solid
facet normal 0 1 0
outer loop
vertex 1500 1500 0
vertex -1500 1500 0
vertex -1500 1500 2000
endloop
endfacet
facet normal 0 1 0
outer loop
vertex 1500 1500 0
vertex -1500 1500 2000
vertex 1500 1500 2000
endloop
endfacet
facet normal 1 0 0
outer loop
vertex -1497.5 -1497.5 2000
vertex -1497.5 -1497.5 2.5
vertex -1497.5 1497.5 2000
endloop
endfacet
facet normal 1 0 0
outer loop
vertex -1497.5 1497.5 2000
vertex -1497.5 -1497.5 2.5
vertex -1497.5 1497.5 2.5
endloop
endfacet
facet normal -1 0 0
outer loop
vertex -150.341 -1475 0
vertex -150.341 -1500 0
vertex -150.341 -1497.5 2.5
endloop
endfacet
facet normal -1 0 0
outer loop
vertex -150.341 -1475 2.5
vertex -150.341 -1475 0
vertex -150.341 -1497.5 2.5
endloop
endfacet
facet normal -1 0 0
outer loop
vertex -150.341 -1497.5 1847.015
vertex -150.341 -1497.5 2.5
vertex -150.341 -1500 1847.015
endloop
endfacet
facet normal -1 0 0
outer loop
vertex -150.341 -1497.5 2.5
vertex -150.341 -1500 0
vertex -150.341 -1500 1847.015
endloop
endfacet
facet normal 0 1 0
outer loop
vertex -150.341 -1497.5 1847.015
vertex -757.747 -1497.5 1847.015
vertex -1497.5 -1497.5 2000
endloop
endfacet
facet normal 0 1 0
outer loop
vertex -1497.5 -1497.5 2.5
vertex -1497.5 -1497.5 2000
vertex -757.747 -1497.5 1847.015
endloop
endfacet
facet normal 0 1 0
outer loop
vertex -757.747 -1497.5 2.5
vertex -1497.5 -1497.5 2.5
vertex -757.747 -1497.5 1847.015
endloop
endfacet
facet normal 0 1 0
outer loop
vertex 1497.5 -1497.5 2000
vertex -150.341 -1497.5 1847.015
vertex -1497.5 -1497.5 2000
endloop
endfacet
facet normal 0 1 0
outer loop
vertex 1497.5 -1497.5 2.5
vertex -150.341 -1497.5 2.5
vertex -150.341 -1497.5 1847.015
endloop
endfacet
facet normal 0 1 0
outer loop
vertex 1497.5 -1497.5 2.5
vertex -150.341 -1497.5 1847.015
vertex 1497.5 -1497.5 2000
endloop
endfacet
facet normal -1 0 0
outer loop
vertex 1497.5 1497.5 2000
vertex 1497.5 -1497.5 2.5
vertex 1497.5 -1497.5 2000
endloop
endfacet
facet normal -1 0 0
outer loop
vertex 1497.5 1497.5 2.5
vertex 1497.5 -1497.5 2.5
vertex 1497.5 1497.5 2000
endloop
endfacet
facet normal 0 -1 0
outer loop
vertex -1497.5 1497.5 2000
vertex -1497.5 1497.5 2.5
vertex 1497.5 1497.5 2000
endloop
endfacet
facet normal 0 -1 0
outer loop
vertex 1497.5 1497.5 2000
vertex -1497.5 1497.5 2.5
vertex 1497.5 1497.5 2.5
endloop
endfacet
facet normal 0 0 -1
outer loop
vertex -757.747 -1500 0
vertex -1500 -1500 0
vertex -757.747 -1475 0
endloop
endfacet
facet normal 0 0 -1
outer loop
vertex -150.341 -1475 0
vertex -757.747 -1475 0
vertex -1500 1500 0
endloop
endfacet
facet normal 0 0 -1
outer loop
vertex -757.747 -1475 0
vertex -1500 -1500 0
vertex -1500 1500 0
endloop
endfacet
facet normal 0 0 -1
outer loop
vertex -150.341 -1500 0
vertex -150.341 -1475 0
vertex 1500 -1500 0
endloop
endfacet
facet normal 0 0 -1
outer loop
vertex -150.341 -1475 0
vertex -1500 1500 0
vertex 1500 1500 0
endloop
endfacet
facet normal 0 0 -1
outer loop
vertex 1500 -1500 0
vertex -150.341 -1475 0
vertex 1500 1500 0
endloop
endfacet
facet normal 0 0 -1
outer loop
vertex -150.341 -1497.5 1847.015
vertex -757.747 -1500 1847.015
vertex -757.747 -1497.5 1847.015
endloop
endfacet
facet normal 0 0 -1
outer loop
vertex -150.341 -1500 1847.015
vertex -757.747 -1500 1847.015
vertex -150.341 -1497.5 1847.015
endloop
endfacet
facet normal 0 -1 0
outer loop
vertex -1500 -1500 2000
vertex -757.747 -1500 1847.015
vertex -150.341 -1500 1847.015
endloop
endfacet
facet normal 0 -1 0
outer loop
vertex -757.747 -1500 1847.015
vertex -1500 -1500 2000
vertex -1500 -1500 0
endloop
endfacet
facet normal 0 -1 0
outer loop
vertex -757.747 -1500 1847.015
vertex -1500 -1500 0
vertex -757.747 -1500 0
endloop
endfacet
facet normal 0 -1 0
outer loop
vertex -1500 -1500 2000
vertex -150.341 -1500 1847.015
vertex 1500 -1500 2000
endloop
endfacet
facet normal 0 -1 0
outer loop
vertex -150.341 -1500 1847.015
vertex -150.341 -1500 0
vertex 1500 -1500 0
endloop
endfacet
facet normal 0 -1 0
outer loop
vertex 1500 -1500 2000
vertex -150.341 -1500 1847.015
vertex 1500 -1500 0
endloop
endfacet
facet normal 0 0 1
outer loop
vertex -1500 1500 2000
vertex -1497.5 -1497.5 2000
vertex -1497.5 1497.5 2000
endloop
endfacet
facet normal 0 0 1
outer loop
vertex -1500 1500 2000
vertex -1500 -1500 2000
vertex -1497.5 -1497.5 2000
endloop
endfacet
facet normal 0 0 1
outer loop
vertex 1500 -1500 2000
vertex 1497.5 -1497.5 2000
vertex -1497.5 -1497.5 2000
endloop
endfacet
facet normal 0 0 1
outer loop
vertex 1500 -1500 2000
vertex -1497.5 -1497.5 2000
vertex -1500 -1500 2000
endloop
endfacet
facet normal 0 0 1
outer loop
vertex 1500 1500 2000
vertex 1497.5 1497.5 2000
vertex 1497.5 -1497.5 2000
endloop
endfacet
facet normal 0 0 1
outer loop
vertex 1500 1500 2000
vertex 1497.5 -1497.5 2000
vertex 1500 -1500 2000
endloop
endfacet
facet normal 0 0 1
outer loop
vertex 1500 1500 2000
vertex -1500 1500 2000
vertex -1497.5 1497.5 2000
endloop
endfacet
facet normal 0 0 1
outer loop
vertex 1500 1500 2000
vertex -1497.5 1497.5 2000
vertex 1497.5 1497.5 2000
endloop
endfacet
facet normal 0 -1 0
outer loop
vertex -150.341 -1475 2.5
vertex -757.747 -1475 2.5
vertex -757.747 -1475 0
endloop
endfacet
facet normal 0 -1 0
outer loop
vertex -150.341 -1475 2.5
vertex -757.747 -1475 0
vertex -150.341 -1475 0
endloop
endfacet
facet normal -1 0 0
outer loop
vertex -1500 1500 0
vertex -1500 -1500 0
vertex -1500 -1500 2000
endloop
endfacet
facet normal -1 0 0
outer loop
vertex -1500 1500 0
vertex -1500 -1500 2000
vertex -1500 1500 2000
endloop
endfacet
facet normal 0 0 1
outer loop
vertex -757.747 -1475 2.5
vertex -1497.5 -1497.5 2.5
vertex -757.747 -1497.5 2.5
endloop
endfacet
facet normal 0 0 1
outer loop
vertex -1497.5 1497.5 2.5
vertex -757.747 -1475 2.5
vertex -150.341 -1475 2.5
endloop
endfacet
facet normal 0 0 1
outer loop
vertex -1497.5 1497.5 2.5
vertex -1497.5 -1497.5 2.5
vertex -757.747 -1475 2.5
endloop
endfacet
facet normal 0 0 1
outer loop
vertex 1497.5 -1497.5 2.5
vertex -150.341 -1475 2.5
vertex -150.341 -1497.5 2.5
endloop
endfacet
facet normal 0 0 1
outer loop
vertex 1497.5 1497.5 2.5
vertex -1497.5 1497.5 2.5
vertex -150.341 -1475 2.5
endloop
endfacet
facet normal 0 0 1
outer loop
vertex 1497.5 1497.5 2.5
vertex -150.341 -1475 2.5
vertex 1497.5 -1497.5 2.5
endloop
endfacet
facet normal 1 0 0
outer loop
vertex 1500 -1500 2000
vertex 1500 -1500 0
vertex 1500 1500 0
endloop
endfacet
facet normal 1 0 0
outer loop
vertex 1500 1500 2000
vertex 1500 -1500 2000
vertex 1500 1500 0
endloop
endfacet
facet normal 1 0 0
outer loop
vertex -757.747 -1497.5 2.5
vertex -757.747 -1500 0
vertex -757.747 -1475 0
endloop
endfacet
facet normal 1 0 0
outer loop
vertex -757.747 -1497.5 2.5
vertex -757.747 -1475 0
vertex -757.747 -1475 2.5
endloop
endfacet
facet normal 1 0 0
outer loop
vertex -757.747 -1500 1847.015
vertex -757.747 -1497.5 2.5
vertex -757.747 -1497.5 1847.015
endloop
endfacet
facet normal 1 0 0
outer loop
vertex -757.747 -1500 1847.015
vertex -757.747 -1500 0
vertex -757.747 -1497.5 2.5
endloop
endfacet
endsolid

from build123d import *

# Parameters (mm, degrees)
F0_W     = 3000
F0_H     = 3000
F1_DEPTH = 2000
F2_T     = -2.5
F3_W     = 607.406541
F3_H     = 1847.015142
F4_DEPTH = 25


with BuildPart() as f1:
    # F0 (on Top) → F1 (new body)
    with BuildSketch(Plane.XY):
        Rectangle(F0_W, F0_H)
    extrude(amount=F1_DEPTH)

    # F2
    f2_openings = [f1.faces().sort_by_distance(p)[0] for p in [
        (0, 0, 2000),
    ]]
    offset(amount=F2_T, openings=f2_openings)

    # F3 (on face) → F4 (cut)
    with BuildSketch(Plane.XZ.offset(1500)):
        with Locations((-454.043903, 923.507571)):
            Rectangle(F3_W, F3_H)
    extrude(amount=-F4_DEPTH, mode=Mode.SUBTRACT)


solid = f1.part
